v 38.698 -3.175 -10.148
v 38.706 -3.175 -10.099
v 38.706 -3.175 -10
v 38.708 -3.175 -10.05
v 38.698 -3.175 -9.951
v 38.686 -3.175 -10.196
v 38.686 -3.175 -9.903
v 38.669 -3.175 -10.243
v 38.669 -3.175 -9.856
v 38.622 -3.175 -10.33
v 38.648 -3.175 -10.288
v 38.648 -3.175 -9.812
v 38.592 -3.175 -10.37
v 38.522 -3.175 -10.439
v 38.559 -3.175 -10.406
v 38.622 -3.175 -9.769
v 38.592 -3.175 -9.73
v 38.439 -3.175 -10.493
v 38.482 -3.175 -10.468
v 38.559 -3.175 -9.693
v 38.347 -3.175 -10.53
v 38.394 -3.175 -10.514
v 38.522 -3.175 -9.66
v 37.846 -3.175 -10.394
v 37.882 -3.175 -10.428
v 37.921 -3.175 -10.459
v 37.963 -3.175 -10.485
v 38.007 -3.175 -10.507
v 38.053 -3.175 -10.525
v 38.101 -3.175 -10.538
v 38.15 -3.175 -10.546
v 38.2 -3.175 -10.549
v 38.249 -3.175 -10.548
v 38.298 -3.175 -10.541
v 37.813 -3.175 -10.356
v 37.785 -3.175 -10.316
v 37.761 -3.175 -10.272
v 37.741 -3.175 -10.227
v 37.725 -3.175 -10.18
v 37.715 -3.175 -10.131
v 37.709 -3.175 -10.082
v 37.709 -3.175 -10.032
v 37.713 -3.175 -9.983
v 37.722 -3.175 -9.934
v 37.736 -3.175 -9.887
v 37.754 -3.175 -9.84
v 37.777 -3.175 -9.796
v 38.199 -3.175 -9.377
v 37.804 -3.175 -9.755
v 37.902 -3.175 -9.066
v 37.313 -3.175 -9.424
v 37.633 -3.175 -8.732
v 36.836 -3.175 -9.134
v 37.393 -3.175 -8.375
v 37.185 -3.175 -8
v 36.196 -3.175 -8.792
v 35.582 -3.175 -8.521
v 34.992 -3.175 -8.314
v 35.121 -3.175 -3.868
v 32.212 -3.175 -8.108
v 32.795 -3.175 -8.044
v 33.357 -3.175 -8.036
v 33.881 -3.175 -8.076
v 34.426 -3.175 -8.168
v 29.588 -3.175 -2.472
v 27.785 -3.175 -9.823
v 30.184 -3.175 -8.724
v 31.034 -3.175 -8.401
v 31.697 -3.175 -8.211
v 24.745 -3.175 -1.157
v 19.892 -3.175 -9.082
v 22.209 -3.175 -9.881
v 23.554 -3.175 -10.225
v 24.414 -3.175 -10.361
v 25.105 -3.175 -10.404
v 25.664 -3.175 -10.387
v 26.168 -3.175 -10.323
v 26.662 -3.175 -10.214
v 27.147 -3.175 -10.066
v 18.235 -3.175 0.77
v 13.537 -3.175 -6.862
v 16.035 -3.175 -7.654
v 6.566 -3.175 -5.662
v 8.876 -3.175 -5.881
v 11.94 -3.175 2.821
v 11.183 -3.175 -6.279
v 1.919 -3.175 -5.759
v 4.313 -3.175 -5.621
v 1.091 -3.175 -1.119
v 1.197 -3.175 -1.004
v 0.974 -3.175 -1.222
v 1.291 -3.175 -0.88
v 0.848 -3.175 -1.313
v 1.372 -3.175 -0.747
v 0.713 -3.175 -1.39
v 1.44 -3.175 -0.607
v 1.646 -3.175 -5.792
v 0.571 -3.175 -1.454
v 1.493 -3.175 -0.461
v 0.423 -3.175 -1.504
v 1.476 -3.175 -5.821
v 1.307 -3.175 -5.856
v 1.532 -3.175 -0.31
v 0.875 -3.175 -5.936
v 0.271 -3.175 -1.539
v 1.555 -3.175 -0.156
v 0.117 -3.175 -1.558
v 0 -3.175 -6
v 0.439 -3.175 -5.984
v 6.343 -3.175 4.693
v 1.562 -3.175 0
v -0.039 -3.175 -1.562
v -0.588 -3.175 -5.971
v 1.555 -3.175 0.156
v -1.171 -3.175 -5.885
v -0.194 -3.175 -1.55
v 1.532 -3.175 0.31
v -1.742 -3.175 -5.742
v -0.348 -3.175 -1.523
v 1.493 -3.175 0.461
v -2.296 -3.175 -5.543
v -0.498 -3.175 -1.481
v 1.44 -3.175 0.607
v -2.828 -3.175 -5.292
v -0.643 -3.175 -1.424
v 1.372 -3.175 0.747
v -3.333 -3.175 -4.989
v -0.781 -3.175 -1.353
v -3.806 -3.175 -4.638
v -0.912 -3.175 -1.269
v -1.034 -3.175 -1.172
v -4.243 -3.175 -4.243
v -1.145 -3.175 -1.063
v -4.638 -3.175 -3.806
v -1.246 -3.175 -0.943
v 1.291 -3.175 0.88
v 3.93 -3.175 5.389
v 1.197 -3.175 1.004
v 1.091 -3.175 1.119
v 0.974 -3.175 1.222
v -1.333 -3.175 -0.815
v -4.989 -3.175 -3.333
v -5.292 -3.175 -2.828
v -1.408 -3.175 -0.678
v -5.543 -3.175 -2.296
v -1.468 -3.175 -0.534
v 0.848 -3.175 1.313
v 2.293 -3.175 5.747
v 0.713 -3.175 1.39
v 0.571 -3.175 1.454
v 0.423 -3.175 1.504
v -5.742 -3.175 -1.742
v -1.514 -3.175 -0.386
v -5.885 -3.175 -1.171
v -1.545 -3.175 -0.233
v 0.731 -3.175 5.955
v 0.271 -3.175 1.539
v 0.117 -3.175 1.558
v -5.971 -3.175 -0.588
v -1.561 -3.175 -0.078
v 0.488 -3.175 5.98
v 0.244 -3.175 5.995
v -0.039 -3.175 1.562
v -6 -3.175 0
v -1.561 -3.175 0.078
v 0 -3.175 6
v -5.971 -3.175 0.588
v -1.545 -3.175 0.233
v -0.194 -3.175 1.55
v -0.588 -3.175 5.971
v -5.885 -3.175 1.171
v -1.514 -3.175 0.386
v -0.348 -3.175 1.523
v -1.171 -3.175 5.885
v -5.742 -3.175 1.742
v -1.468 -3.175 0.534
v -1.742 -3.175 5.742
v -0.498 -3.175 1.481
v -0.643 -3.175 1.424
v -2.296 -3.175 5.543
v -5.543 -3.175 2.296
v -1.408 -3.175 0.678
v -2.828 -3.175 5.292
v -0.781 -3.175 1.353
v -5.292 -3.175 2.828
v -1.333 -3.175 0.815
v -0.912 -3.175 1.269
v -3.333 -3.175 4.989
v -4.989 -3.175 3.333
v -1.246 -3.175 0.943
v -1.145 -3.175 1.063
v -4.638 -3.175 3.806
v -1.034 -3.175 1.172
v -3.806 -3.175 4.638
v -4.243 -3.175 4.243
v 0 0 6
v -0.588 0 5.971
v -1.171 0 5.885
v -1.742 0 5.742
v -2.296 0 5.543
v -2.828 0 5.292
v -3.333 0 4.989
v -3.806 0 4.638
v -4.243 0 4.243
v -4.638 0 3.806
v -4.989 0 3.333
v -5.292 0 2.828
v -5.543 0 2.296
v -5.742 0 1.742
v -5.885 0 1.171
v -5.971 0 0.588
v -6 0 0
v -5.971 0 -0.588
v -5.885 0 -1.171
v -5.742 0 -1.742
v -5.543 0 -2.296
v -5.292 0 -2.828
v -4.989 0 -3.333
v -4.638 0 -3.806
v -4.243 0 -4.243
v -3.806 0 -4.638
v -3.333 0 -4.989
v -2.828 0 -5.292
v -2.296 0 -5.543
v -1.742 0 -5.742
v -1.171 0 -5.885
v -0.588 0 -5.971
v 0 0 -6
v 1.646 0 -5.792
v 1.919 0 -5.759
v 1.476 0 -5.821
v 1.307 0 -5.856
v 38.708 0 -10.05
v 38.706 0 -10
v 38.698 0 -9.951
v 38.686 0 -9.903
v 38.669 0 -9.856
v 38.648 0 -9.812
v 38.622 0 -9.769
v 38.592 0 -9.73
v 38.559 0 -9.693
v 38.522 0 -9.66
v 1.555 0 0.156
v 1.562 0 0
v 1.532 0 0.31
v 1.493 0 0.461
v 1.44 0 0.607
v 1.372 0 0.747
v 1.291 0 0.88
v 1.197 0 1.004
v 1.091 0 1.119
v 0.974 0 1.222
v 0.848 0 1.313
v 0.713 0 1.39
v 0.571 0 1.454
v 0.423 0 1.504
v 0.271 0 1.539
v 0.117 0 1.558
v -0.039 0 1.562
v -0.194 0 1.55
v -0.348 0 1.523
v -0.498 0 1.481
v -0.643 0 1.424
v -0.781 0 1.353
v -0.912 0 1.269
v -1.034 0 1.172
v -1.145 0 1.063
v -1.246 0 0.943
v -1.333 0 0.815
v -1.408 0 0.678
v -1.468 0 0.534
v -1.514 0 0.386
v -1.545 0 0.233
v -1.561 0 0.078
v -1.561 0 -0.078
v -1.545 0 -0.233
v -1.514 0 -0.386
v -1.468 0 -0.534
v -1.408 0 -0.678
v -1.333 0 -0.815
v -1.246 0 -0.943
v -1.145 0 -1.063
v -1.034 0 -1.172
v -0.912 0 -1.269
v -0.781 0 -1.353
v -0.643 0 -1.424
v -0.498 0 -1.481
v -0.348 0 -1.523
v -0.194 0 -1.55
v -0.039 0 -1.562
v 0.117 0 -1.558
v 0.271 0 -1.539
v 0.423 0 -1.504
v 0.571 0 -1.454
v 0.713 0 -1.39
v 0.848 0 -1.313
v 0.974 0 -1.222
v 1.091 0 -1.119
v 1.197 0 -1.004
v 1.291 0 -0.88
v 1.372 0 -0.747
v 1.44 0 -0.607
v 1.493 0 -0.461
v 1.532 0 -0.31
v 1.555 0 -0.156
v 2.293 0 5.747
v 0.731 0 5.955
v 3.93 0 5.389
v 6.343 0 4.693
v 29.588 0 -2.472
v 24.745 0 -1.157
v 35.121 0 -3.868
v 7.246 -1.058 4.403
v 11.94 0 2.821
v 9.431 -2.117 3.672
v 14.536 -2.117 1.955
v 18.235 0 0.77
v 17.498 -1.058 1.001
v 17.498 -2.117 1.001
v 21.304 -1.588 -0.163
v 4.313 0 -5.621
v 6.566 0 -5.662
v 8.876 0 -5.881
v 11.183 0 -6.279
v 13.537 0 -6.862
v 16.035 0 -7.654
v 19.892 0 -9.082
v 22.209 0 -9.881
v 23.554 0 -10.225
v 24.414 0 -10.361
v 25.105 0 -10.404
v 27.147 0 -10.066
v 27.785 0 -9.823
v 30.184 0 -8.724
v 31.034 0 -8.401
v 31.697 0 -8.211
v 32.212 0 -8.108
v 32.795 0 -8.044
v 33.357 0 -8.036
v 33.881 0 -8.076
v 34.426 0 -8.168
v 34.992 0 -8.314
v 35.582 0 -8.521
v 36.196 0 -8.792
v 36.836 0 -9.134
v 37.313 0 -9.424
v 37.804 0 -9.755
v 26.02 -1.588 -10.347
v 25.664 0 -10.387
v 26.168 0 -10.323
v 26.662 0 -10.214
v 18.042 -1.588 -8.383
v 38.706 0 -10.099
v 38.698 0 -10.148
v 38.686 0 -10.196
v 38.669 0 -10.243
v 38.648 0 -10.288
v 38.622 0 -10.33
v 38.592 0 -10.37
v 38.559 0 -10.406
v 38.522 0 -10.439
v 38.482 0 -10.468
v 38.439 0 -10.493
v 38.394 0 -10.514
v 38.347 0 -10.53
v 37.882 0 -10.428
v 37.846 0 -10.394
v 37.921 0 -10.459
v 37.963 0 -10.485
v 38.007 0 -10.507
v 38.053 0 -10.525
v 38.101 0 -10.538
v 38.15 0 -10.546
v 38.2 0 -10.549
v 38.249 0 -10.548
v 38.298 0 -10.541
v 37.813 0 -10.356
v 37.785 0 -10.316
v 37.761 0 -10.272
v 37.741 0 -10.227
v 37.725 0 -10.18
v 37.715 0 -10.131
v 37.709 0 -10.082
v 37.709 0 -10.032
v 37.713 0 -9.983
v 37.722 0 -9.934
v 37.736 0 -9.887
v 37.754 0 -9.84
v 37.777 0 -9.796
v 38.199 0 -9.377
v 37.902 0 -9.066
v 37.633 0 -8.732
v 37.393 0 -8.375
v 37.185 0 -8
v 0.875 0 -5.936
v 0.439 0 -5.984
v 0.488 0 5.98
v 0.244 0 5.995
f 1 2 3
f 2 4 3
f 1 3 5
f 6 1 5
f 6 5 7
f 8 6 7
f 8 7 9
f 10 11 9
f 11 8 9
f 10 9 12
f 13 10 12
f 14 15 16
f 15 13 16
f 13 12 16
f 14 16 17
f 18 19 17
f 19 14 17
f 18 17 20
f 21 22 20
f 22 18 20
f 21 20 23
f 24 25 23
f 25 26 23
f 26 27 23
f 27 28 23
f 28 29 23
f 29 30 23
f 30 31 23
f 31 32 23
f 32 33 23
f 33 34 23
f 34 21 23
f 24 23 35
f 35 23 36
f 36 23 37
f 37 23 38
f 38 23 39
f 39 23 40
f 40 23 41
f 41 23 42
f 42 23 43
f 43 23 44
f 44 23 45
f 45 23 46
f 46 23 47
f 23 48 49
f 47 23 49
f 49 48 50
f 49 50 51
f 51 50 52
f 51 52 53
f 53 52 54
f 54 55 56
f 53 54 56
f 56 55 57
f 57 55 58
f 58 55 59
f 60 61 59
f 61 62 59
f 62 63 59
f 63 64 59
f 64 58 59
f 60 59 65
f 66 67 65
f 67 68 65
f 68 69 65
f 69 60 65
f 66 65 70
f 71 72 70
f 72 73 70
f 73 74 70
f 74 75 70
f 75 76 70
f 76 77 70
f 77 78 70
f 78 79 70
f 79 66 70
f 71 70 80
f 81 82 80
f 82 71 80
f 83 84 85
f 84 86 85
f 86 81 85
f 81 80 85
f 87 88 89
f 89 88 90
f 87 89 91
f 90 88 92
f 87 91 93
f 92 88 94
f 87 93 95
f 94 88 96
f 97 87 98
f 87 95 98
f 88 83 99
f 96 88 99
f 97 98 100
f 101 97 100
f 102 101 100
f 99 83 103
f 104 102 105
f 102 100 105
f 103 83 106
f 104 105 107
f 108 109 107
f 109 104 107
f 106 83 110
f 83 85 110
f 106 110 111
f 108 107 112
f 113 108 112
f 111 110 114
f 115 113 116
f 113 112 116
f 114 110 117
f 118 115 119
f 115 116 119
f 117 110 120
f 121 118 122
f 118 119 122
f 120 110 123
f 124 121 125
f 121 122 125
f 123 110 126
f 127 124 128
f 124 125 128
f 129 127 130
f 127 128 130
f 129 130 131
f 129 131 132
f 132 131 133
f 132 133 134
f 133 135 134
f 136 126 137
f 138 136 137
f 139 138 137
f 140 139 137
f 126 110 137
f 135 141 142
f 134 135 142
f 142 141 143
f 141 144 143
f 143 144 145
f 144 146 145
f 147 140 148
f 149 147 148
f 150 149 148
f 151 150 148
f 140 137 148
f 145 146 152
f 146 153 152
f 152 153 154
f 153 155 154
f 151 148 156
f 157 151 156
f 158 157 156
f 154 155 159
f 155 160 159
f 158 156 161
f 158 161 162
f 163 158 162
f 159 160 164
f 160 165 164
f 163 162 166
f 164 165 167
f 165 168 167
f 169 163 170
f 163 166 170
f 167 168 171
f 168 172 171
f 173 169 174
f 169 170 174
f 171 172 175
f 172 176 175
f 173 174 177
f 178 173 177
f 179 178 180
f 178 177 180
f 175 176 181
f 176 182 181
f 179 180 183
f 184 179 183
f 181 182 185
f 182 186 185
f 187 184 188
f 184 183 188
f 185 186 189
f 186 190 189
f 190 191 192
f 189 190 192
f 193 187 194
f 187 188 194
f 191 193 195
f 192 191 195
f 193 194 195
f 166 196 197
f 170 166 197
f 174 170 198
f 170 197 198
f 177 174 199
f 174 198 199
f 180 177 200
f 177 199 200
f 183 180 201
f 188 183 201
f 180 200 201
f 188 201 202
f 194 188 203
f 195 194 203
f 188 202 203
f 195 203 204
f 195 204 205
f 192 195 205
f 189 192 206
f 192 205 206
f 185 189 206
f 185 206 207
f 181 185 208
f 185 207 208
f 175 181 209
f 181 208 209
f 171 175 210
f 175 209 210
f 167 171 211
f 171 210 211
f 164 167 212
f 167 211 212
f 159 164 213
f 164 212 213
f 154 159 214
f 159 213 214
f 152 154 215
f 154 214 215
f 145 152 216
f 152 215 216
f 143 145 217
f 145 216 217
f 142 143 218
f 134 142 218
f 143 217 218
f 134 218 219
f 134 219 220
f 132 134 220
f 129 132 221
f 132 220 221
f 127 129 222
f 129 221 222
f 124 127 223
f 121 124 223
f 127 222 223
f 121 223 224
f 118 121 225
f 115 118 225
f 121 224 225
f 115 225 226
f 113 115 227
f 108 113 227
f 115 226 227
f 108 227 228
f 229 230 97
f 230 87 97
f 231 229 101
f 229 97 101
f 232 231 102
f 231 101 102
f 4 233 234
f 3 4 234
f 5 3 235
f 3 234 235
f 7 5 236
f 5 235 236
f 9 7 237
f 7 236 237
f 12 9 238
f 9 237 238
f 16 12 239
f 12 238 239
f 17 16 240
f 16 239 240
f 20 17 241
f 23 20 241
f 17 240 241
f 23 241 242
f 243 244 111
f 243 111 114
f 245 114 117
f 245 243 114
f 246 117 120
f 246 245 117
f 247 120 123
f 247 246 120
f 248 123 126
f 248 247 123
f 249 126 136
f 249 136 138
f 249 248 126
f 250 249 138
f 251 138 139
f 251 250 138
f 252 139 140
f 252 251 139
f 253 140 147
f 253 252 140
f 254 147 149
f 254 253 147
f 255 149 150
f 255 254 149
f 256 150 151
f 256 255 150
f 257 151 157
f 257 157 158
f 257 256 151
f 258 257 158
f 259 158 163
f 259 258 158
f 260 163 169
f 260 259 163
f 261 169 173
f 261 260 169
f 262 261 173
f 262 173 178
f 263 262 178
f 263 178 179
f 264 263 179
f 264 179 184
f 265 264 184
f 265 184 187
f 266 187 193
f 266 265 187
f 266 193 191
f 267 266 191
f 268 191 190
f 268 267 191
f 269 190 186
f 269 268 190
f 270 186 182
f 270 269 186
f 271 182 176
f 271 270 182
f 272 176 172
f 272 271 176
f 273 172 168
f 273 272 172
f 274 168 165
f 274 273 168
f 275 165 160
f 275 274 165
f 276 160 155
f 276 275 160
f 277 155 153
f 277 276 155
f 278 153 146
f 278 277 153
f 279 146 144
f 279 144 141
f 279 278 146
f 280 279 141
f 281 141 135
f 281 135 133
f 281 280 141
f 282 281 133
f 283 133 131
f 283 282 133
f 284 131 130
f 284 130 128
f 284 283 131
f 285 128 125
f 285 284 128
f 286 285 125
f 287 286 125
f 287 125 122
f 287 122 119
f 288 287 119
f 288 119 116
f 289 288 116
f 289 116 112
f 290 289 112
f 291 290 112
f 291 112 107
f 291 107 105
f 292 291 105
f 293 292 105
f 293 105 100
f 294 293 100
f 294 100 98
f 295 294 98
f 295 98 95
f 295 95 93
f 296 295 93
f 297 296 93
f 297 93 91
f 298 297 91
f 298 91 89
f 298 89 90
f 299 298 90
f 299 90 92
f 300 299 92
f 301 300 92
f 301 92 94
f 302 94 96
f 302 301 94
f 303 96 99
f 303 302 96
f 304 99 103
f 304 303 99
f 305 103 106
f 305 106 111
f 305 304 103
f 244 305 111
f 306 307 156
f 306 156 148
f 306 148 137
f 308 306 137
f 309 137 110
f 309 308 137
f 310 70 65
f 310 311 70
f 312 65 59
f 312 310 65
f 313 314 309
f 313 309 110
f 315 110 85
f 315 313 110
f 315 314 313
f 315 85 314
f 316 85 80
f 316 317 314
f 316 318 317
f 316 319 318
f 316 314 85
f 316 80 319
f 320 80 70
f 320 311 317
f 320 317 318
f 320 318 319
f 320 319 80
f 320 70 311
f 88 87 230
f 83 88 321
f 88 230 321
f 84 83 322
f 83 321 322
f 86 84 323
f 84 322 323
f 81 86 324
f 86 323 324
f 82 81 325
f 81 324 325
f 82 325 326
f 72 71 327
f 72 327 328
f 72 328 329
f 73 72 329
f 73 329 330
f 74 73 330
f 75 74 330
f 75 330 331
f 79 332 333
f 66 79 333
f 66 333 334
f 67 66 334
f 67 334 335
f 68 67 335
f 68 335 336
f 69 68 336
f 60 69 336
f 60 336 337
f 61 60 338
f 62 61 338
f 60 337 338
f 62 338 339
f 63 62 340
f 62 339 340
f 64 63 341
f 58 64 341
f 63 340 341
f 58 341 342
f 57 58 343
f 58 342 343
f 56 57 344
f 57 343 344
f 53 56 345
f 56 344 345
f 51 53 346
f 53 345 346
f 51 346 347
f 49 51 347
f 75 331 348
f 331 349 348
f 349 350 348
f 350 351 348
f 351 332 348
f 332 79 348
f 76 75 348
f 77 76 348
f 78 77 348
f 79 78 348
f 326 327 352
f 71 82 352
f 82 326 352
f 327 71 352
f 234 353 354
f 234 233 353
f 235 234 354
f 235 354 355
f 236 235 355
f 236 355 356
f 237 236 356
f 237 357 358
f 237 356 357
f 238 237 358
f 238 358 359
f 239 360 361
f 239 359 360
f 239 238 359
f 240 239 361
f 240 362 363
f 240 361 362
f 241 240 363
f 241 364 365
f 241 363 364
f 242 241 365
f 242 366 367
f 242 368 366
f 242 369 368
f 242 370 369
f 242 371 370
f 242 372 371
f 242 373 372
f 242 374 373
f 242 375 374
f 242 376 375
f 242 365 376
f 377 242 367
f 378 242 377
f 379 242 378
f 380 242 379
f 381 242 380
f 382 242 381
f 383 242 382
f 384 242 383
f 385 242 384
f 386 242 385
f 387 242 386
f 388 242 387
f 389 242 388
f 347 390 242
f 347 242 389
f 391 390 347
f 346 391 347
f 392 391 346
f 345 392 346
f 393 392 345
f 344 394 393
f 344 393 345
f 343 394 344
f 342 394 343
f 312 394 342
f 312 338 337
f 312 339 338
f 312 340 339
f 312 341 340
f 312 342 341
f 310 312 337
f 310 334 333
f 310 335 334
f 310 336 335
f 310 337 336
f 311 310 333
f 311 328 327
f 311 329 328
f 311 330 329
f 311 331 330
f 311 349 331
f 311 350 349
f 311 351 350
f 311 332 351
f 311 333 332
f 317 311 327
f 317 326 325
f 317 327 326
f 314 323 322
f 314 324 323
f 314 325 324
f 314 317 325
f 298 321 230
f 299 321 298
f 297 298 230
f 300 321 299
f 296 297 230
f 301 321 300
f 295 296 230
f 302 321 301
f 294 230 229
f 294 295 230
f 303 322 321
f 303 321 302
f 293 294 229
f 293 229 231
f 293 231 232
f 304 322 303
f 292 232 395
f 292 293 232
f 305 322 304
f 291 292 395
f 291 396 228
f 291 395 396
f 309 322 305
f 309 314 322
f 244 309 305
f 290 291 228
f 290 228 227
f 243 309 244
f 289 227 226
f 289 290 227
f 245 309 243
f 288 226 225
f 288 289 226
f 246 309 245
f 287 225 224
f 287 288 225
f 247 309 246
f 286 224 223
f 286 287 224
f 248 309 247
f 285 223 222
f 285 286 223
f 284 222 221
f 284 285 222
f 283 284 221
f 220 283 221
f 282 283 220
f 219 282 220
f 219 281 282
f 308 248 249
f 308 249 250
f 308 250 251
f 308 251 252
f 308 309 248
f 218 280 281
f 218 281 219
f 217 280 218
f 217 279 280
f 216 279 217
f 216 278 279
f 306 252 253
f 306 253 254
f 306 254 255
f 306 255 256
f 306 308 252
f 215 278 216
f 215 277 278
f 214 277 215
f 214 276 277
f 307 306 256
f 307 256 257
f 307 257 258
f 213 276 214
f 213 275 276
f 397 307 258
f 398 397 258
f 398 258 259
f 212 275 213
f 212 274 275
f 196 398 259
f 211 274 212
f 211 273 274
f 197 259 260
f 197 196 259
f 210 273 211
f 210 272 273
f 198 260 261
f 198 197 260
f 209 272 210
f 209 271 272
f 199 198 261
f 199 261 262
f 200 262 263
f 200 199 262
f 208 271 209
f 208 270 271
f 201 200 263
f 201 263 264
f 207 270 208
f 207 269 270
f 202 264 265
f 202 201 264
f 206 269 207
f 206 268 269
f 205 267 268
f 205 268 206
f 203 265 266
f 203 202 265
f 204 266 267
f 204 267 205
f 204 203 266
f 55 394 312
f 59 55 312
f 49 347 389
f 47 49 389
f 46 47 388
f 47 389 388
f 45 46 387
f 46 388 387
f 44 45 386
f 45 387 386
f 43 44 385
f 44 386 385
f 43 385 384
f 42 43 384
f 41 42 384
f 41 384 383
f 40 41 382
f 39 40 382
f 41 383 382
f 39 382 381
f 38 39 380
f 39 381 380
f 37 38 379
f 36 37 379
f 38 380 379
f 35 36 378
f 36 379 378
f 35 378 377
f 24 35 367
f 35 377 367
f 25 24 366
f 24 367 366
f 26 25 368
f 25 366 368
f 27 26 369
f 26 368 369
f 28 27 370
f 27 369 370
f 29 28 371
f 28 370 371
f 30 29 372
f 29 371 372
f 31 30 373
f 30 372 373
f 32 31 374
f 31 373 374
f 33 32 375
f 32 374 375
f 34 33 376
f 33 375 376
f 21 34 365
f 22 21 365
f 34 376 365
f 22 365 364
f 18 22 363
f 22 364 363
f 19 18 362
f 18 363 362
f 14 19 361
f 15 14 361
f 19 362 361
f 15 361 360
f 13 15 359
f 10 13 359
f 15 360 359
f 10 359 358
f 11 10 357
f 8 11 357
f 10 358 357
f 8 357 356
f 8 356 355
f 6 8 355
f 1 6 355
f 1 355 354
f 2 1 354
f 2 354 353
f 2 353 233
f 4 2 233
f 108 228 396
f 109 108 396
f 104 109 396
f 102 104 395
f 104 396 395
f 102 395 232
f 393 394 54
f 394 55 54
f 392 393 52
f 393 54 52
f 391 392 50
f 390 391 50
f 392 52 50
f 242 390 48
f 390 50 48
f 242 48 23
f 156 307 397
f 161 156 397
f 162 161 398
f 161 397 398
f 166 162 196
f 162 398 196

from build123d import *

# Parameters (mm, degrees)
F0_R     = 1.5625
F1_DEPTH = 3.175
F2_R     = 5


# Not quite as in the source:
# - two fillets or chamfers of one size are made in one step
# - a length typed as a fraction of an inch, garbled in the dataset ("3 / 203.2 mm" for 3/8 in), is restored


with BuildPart() as f1:
    # F0 (on Front) → F1 (new body)
    with BuildSketch(Plane.XZ):
        with BuildLine():
            add(Edge.make_bspline(
                [(0, 6), (0.244167608, 5.9909795741), (0.4874256523, 5.9760413709), (0.7309494159, 5.9553096436)],
                knots=[0, 0, 0, 0, 1.4561246163, 1.4561246163, 1.4561246163, 1.4561246163], degree=3))
            ThreePointArc((0, 6), (-6, 0), (0, -6))
            add(Edge.make_bspline(
                [(0, -6), (0.5264900217, -5.918222626), (1.0434262259, -5.850580103), (1.5510661896, -5.7960498338)],
                knots=[0, 0, 0, 0, 0.0231840948, 0.0231840948, 0.0231840948, 0.0231840948], degree=3))
            ThreePointArc((1.5510661896, -5.7960498338), (4.7595376423, -3.6533274465), (6, 0))
            ThreePointArc((6, 0), (4.4936453184, 3.9758208904), (0.7309494159, 5.9553096436))
        make_face()
        Circle(F0_R, mode=Mode.SUBTRACT)
        with BuildLine():
            ThreePointArc((0.7309494159, 5.9553096436), (0.3661571645, 5.9888169893), (0, 6))
            add(Edge.make_bspline(
                [(0, 6), (0.244167608, 5.9909795741), (0.4874256523, 5.9760413709), (0.7309494159, 5.9553096436)],
                knots=[0, 0, 0, 0, 1.4561246163, 1.4561246163, 1.4561246163, 1.4561246163], degree=3))
        make_face()
        with BuildLine():
            add(Edge.make_bspline(
                [(0, -6), (0.5264900217, -5.918222626), (1.0434262259, -5.850580103), (1.5510661896, -5.7960498338)],
                knots=[0, 0, 0, 0, 0.0231840948, 0.0231840948, 0.0231840948, 0.0231840948], degree=3))
            ThreePointArc((0, -6), (0.7822087309, -5.9487939535), (1.5510661896, -5.7960498338))
        make_face()
        with BuildLine():
            add(Edge.make_bspline(
                [(0.7309494159, 5.9553096436), (6.5885872075, 5.4566357259), (12.5999644874, 1.6059529825), (35.1214148104, -3.8675169926)],
                knots=[1.4561246163, 1.4561246163, 1.4561246163, 1.4561246163, 36.4812509364, 36.4812509364, 36.4812509364, 36.4812509364], degree=3))
            ThreePointArc((0.7309494159, 5.9553096436), (4.4936453184, 3.9758208904), (6, 0))
            ThreePointArc((6, 0), (4.7595376423, -3.6533274465), (1.5510661896, -5.7960498338))
            add(Edge.make_bspline(
                [(1.5510661896, -5.7960498338), (14.0781923654, -4.4503961965), (25.6888672866, -15.6775062325), (32.1799724767, -5.7946943127), (37.8041636238, -9.7550129686)],
                knots=[0.0231840948, 0.0231840948, 0.0231840948, 0.0231840948, 0.5953023308, 0.9906507432, 0.9906507432, 0.9906507432, 0.9906507432], degree=3))
            ThreePointArc((37.8041636238, -9.7550129686), (37.8853336655, -9.6677699854), (37.984842679, -9.6022118429))
            Line((37.984842679, -9.6022118429), (35.1214148104, -3.8675169926))
        make_face()
        with BuildLine():
            ThreePointArc((37.984842679, -9.6022118429), (37.8853336655, -9.6677699854), (37.8041636238, -9.7550129686))
            add(Edge.make_bspline(
                [(37.8041636238, -9.7550129686), (37.9371653146, -9.8486671606), (38.0718288537, -9.9467945932), (38.2082048467, -10.0495476698)],
                knots=[0.9906507432, 0.9906507432, 0.9906507432, 0.9906507432, 1, 1, 1, 1], degree=3))
            Line((38.2082048467, -10.0495476698), (37.984842679, -9.6022118429))
        make_face()
        with BuildLine():
            add(Edge.make_bspline(
                [(37.8041636238, -9.7550129686), (37.9371653146, -9.8486671606), (38.0718288537, -9.9467945932), (38.2082048467, -10.0495476698)],
                knots=[0.9906507432, 0.9906507432, 0.9906507432, 0.9906507432, 1, 1, 1, 1], degree=3))
            ThreePointArc((37.8041636238, -9.7550129686), (38.053318778, -10.5249530818), (38.7082048467, -10.0495476698))
            ThreePointArc((38.7082048467, -10.0495476698), (38.4711867055, -9.6242941667), (37.984842679, -9.6022118429))
            Line((37.984842679, -9.6022118429), (38.2082048467, -10.0495476698))
        make_face()
    extrude(amount=F1_DEPTH)

    # F2
    f2_edges = [f1.edges().sort_by_distance(p)[0] for p in [
        (1.551066, -1.5875, -5.79605),
        (37.984843, -1.5875, -9.602212),
    ]]
    fillet(f2_edges, radius=F2_R)


solid = f1.part
